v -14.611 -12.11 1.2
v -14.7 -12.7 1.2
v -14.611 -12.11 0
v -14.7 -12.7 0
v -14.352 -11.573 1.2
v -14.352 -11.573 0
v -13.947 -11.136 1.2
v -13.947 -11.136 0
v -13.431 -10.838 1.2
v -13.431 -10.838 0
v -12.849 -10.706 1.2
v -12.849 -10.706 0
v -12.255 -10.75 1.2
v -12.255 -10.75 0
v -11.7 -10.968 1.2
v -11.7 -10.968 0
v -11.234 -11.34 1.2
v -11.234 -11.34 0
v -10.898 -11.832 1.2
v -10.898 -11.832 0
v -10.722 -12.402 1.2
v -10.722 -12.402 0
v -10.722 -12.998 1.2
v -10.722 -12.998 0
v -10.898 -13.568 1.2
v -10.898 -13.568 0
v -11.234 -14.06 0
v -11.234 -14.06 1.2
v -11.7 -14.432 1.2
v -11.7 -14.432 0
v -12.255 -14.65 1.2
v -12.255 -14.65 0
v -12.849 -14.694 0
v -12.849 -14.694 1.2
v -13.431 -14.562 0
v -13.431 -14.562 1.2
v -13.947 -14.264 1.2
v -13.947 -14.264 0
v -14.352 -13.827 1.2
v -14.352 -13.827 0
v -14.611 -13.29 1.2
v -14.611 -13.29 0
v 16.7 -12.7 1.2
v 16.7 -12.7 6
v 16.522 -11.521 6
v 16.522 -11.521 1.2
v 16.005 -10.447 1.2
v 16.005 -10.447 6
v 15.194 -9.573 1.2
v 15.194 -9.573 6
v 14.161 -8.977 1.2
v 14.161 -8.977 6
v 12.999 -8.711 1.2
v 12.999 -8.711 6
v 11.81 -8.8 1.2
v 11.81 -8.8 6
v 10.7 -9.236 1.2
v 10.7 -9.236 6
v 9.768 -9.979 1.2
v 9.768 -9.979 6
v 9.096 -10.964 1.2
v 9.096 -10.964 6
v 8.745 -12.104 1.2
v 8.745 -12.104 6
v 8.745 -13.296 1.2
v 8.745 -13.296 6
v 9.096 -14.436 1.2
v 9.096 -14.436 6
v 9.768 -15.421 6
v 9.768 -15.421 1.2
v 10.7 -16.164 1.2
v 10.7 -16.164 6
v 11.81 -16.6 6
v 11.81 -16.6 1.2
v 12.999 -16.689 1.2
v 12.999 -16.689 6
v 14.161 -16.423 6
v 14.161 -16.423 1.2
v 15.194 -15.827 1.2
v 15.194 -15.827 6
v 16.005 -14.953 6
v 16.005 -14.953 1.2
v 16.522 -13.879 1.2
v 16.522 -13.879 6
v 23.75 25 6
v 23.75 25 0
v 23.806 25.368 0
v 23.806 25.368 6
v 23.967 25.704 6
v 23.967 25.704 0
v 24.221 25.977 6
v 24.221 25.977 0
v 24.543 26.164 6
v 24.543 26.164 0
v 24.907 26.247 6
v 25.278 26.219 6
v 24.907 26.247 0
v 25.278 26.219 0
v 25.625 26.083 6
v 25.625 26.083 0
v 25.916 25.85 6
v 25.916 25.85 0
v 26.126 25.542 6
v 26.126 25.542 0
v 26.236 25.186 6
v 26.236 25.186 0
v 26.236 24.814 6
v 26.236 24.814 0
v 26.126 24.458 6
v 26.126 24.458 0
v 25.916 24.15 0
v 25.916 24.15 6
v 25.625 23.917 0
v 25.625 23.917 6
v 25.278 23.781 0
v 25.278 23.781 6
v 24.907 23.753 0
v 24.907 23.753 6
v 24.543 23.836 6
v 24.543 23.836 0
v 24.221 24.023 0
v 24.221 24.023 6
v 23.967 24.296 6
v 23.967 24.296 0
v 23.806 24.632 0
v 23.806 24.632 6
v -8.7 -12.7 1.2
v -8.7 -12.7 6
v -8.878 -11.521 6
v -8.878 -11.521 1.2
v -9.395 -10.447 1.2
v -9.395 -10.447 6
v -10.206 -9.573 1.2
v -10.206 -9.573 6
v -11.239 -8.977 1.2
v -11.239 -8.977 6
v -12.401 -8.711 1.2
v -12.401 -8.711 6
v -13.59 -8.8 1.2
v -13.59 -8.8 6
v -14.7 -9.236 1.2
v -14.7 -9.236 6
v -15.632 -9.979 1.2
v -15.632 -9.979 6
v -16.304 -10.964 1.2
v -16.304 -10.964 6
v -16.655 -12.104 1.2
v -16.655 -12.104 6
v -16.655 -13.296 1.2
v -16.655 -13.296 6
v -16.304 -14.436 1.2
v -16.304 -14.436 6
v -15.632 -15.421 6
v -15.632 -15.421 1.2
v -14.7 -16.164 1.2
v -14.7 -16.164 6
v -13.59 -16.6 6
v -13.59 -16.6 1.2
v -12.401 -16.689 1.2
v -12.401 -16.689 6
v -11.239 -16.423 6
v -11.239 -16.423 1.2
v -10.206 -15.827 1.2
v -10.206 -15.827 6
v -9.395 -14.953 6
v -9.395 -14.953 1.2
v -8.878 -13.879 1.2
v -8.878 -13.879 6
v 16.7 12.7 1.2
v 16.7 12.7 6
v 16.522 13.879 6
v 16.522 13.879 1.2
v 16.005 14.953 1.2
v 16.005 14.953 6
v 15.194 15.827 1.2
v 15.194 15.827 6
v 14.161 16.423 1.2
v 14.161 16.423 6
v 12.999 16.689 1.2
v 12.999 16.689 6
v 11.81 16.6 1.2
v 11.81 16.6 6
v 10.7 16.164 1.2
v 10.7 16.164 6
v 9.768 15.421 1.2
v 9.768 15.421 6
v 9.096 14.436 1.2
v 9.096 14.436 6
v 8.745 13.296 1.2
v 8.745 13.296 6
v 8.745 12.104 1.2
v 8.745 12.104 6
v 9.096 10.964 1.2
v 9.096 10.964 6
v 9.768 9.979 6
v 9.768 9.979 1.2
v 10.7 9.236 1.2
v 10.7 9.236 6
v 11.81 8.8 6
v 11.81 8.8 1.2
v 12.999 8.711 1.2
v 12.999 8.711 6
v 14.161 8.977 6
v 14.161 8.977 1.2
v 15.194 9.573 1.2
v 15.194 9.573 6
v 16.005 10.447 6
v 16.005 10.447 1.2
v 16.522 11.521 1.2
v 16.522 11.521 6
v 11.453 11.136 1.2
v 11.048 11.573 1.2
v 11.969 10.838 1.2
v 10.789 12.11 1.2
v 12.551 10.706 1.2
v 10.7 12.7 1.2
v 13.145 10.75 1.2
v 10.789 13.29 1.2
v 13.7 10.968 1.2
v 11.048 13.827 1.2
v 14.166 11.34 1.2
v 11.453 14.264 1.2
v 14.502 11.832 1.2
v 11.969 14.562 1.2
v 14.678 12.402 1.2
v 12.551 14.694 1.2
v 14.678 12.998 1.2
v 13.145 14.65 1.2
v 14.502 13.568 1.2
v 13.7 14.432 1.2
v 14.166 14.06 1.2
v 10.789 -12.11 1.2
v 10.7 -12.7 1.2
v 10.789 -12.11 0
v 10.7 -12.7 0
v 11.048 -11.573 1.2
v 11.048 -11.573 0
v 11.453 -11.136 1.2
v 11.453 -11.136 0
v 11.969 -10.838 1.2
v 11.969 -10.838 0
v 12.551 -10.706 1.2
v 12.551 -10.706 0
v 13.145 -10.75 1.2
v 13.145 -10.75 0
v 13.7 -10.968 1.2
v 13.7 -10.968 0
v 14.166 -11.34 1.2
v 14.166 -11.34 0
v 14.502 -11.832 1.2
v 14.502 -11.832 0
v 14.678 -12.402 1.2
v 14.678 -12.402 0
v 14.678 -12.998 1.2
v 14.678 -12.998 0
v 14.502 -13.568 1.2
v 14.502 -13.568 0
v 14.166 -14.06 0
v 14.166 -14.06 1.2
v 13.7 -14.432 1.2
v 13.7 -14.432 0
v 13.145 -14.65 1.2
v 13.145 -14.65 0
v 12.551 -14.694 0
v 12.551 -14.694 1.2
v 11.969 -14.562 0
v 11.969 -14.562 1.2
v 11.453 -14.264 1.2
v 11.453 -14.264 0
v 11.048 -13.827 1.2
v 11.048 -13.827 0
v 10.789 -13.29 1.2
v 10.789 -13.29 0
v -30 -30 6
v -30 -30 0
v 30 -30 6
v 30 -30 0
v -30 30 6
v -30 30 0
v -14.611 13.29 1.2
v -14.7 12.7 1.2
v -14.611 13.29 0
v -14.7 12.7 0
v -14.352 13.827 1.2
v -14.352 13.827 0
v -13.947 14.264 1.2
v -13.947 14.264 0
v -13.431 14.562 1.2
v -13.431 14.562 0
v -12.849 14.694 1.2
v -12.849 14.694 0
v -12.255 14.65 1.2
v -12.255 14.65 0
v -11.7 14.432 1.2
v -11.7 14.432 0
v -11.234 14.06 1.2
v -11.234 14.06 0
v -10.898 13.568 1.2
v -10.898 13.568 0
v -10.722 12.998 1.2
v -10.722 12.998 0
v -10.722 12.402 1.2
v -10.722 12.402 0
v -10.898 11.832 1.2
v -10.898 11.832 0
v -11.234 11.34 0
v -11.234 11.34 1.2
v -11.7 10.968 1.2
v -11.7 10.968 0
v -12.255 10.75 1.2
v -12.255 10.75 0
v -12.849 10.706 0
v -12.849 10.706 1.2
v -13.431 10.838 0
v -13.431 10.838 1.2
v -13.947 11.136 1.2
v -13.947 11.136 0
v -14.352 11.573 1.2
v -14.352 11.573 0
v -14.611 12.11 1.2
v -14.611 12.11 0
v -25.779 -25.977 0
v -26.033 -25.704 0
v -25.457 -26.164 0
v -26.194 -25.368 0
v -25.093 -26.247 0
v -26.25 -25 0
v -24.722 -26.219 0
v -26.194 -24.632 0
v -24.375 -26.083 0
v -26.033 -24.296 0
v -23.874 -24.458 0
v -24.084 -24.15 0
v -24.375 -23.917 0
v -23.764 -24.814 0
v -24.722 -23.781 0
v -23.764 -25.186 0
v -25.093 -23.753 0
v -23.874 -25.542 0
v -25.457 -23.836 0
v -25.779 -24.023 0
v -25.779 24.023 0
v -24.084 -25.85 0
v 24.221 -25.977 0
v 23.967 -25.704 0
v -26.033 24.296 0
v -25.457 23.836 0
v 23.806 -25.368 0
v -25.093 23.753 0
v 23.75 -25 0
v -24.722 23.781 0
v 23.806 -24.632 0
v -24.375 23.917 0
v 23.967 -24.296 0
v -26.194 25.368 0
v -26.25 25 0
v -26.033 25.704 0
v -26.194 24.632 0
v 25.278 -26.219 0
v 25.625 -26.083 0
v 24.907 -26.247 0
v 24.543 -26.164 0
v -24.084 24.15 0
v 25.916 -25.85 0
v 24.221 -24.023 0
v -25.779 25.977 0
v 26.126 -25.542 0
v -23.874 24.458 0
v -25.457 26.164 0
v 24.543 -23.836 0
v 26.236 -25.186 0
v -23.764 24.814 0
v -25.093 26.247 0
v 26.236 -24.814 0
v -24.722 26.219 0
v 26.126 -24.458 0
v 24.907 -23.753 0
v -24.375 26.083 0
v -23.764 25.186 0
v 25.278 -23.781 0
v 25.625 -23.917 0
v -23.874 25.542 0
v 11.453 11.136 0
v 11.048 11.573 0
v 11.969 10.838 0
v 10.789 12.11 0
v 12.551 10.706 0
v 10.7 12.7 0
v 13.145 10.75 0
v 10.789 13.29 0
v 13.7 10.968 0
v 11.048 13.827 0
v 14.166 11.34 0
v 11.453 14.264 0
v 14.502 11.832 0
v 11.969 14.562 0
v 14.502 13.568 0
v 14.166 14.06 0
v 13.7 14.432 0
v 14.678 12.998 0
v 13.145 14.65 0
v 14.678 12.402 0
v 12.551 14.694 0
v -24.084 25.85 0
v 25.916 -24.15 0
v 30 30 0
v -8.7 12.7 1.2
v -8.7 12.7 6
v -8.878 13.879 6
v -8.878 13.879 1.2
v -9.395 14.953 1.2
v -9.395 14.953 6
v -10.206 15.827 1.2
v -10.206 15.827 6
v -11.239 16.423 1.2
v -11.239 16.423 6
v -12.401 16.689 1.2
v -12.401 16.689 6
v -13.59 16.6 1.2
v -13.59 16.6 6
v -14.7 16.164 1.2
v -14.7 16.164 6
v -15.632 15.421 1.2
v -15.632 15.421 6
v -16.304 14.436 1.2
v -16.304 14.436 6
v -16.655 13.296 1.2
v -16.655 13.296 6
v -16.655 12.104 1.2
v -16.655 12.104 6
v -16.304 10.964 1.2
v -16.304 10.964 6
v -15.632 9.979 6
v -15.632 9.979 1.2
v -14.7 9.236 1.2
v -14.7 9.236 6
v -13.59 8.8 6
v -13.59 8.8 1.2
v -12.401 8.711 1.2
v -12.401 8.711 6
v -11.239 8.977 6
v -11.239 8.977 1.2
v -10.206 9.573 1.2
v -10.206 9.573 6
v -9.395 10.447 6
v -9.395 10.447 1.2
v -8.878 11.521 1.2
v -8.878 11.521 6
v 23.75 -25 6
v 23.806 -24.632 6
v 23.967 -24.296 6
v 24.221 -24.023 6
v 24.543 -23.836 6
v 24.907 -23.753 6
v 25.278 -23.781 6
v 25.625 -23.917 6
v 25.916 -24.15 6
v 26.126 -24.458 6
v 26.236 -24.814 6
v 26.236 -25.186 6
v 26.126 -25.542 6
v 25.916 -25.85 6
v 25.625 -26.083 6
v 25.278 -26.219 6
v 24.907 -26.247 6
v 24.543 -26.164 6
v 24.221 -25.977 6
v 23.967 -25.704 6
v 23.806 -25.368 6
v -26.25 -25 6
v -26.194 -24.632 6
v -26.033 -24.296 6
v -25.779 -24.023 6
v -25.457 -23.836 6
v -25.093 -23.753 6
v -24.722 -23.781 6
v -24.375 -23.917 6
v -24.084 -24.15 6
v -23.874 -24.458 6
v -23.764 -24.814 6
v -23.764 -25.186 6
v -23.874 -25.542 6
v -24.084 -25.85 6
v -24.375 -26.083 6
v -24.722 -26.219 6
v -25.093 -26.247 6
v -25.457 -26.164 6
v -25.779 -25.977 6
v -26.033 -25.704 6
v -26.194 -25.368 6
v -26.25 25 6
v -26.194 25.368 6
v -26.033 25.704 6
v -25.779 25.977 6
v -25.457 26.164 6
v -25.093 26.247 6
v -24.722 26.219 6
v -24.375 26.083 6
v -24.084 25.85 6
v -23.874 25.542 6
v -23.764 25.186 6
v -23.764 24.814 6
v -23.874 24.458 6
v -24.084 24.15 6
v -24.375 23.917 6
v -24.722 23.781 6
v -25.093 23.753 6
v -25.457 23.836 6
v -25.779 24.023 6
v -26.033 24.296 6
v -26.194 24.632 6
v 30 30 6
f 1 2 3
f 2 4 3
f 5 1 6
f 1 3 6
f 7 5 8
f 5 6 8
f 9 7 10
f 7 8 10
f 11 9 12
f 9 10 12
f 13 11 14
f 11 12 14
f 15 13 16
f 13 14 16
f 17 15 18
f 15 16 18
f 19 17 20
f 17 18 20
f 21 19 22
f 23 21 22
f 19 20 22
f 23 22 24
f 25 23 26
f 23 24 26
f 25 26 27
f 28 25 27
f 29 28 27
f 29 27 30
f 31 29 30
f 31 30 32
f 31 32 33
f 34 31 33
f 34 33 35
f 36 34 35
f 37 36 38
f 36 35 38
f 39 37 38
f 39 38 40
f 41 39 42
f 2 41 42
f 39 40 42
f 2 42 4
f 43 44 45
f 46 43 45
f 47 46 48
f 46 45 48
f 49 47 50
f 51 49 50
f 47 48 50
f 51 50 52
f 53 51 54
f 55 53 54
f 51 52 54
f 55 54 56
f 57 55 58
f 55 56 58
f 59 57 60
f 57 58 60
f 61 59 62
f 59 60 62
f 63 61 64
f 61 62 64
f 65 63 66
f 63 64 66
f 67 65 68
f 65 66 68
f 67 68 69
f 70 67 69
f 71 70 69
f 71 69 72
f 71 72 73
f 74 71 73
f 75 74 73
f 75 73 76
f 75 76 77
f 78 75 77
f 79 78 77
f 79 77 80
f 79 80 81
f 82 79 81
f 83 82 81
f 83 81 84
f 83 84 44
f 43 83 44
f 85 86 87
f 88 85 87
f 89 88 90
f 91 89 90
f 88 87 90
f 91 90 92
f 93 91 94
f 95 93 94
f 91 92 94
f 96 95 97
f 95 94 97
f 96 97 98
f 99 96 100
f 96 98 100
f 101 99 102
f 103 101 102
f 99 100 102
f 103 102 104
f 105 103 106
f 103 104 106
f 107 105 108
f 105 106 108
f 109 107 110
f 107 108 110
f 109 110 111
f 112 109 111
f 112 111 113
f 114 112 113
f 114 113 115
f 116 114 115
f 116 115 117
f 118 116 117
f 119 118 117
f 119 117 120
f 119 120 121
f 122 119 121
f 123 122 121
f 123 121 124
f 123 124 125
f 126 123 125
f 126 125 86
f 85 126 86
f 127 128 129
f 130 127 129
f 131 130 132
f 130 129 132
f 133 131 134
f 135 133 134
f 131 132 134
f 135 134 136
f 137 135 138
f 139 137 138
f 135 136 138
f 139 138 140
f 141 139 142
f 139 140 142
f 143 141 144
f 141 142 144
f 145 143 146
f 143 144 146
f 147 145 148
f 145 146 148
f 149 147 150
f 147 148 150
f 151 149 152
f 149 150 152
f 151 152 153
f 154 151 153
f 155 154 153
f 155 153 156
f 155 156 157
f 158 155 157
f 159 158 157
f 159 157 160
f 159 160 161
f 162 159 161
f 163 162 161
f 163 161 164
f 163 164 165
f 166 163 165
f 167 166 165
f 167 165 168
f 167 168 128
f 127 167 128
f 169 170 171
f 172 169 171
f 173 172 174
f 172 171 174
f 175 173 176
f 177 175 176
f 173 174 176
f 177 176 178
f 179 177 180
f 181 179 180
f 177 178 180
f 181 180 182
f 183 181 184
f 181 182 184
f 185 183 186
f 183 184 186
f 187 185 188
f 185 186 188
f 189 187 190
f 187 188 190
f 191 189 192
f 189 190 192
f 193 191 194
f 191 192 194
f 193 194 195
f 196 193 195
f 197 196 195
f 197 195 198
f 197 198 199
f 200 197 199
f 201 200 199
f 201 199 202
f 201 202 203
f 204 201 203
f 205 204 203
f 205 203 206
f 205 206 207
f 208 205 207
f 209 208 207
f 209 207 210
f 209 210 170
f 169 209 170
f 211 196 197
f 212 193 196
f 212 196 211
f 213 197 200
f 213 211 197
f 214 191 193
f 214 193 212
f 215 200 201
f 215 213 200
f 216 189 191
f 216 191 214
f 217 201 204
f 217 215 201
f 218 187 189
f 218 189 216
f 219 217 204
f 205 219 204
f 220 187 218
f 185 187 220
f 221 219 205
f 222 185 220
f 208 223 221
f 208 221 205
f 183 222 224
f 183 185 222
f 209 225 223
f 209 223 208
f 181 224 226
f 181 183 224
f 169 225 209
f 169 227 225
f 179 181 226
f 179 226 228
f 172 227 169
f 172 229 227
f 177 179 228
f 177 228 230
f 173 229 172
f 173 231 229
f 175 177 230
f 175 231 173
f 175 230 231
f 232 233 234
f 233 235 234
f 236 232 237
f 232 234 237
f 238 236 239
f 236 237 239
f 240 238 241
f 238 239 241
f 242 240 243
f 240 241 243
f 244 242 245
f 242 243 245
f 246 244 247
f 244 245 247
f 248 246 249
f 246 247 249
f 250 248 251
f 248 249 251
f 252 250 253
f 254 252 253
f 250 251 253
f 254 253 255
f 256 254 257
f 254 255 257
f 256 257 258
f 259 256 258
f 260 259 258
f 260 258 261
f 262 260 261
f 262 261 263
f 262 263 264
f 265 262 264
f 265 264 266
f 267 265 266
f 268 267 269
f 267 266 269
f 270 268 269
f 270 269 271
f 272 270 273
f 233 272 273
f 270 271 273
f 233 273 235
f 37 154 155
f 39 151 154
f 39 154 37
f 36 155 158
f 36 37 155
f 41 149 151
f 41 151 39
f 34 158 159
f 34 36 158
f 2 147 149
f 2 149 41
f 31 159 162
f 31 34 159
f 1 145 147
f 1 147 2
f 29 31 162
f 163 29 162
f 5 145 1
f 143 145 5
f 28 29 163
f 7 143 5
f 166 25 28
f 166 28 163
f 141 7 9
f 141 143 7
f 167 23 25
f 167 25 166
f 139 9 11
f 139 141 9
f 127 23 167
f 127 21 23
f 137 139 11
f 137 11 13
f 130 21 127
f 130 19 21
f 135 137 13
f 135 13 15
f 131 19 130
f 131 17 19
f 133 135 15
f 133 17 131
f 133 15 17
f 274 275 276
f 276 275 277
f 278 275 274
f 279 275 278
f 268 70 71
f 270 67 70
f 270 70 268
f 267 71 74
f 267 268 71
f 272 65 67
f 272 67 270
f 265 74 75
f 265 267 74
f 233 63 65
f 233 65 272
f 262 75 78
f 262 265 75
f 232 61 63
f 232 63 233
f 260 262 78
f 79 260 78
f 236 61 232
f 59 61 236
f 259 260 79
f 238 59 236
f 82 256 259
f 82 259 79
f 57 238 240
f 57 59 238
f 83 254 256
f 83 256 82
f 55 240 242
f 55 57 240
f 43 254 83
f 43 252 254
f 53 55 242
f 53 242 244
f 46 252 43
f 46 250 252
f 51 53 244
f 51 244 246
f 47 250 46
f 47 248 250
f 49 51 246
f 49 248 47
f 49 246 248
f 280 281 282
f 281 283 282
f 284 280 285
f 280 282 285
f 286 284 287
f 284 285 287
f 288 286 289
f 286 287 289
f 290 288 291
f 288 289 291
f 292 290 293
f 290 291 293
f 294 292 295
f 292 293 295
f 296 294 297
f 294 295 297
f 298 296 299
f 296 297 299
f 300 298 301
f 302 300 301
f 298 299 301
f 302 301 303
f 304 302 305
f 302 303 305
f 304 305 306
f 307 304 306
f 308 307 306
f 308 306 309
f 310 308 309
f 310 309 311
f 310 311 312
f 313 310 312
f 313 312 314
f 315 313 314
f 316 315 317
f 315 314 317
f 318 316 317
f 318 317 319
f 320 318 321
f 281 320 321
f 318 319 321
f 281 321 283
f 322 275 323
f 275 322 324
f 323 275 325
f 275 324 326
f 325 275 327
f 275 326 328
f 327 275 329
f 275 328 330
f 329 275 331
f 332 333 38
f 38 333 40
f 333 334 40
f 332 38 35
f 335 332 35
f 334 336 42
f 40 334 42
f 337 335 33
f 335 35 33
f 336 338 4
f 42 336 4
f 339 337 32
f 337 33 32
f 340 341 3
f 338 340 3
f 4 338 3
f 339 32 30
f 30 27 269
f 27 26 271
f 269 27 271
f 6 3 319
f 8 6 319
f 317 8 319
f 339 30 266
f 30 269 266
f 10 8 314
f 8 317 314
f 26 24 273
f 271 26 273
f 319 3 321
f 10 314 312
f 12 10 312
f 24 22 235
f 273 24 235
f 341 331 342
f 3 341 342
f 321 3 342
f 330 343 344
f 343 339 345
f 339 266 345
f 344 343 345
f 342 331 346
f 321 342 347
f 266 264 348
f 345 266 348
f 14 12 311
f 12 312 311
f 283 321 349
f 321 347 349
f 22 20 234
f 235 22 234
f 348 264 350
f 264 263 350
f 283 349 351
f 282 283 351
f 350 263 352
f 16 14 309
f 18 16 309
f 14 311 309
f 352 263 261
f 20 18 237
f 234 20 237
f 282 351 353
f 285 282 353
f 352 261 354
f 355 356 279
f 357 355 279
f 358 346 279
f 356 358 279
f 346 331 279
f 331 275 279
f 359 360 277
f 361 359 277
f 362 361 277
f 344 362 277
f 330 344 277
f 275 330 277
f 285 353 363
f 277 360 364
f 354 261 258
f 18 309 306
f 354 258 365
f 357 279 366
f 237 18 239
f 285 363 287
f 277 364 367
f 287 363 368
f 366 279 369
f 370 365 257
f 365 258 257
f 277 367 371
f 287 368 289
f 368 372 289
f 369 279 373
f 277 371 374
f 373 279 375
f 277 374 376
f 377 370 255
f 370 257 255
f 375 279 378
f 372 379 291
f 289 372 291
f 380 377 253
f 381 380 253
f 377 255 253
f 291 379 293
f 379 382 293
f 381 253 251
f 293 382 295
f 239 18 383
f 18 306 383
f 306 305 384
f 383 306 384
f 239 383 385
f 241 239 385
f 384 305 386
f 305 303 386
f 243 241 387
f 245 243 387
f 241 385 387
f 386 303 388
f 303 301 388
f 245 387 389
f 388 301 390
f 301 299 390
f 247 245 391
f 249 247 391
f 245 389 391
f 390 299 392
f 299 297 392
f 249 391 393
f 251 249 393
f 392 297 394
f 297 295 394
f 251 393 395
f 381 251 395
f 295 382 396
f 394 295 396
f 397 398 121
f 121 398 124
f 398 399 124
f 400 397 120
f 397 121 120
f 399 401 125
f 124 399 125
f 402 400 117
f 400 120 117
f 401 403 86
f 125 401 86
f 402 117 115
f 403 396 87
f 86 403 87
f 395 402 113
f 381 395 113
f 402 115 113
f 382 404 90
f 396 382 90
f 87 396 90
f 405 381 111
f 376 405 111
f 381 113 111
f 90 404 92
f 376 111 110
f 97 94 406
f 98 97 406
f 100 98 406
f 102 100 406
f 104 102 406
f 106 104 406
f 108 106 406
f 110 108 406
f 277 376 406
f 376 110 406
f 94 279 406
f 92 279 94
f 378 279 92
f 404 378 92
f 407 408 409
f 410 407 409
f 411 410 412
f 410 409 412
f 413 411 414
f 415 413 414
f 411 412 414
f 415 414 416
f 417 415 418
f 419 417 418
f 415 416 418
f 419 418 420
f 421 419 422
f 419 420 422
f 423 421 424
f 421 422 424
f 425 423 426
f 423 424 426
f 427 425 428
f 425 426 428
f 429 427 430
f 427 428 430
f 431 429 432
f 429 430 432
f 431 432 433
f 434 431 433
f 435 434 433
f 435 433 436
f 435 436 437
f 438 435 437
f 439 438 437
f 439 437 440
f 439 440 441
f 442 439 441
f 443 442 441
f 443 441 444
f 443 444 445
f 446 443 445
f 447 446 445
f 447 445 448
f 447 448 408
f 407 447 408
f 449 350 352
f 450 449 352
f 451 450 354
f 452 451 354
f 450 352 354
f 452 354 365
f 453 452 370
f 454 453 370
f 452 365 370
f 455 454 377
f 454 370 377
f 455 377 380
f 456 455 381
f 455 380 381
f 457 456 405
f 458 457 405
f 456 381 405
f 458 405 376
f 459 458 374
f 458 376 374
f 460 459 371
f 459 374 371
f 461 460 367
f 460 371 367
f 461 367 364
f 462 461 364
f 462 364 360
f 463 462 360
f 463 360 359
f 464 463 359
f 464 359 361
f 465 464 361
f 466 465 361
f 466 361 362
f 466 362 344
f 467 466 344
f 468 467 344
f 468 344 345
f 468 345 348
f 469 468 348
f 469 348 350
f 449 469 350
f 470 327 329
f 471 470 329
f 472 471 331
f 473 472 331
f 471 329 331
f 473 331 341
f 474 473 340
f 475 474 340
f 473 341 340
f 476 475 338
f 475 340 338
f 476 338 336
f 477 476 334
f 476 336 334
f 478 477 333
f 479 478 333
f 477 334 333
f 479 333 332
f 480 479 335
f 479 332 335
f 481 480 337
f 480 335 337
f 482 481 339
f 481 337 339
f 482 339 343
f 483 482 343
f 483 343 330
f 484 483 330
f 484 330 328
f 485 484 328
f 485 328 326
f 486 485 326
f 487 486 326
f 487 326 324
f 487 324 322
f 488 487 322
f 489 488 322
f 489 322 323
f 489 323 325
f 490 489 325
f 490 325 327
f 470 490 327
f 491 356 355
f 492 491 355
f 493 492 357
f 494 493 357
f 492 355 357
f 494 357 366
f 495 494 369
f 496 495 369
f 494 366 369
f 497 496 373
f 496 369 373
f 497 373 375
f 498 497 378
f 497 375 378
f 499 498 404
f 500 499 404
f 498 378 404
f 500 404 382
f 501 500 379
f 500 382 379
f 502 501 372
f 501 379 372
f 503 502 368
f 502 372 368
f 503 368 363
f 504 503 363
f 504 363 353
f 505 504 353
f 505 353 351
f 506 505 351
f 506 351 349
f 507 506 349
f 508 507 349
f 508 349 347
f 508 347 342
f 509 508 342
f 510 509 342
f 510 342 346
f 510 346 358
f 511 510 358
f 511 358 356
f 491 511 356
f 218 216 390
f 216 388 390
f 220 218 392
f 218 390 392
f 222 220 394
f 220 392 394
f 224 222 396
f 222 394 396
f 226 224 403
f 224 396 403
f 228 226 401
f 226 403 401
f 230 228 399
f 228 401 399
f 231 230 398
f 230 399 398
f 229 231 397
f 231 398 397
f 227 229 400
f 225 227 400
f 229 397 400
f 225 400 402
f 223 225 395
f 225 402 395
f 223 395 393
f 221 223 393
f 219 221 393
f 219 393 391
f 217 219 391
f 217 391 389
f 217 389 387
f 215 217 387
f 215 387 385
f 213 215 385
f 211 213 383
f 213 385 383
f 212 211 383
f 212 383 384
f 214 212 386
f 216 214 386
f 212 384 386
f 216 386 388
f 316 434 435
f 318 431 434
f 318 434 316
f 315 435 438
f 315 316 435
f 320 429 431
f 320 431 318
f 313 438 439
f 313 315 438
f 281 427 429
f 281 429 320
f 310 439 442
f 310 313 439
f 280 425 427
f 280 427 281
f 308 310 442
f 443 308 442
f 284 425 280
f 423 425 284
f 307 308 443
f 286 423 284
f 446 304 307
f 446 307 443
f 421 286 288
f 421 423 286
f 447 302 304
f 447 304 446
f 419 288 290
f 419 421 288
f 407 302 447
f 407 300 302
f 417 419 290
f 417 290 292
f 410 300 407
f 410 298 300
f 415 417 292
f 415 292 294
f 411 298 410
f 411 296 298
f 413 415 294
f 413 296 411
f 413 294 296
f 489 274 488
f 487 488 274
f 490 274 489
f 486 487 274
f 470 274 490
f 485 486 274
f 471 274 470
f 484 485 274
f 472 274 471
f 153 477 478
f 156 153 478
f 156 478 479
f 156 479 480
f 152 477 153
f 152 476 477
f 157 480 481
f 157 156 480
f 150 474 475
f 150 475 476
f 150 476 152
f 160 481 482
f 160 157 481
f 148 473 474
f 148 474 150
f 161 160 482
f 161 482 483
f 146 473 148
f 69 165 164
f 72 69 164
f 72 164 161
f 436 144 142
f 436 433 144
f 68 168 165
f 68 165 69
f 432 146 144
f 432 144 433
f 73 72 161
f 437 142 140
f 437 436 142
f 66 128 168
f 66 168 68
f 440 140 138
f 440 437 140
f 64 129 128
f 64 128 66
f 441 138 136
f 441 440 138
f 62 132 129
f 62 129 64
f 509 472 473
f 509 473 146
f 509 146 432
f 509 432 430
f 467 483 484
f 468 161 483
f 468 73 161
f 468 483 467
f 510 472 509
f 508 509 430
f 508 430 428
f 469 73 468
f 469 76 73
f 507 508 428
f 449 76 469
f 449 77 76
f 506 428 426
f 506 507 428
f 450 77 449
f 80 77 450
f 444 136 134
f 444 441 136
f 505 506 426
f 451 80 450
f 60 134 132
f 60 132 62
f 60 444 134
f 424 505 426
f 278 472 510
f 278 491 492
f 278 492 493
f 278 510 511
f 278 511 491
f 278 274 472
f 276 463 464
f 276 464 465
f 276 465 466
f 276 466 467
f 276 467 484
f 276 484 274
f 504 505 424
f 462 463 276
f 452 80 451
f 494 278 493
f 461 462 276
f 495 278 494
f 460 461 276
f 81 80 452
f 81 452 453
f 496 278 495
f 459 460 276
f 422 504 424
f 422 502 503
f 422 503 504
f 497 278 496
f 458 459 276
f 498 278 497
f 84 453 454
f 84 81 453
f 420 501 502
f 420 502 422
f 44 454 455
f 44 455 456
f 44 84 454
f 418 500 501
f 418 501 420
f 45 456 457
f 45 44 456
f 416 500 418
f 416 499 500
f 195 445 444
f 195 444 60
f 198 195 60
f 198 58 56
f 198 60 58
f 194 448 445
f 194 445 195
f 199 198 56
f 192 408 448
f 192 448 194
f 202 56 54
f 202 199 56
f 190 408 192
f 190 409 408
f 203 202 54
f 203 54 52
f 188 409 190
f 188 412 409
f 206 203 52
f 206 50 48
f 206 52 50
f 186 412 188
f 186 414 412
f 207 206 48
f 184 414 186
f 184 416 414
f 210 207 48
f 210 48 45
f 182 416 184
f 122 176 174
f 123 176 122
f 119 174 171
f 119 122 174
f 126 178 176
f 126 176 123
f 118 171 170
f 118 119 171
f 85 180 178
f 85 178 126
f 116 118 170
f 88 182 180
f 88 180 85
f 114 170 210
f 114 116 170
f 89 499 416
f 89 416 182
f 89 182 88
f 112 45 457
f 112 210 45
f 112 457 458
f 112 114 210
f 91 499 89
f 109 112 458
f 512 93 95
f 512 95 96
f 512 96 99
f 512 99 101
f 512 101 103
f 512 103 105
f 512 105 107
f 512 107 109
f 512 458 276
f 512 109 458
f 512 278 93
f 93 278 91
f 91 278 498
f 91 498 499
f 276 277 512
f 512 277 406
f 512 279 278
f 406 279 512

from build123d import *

# Parameters (mm, degrees)
SKETCH_1_W                = 60
SKETCH_1_H                = 60
EXTRUDE_1_DEPTH           = 6
HOLE_WIZARD_M3_1_D        = 2.5
HOLE_WIZARD_1_D           = 4
HOLE_WIZARD_1_CBORE_D     = 8
HOLE_WIZARD_1_CBORE_DEPTH = 4.8


with BuildPart() as part:
    # 草图1 → 凸台-拉伸1 (new body)
    with BuildSketch(Plane.XY):
        Rectangle(SKETCH_1_W, SKETCH_1_H)
    extrude(amount=EXTRUDE_1_DEPTH)

    # M3 螺纹孔1 (through all)
    with Locations(Plane(origin=(-25, 25, 6), x_dir=(1, 0, 0), z_dir=(0, 0, 1))):
        with Locations((0, 0), (50, 0), (50, -50), (0, -50)):
            Hole(HOLE_WIZARD_M3_1_D / 2)

    # 孔1 (through all)
    with Locations(Plane(origin=(-12.7, 12.7, 6), x_dir=(1, 0, 0), z_dir=(0, 0, 1))):
        with Locations((0, 0), (25.4, 0), (25.4, -25.4), (0, -25.4)):
            CounterBoreHole(HOLE_WIZARD_1_D / 2, HOLE_WIZARD_1_CBORE_D / 2, HOLE_WIZARD_1_CBORE_DEPTH)


solid = part.part
